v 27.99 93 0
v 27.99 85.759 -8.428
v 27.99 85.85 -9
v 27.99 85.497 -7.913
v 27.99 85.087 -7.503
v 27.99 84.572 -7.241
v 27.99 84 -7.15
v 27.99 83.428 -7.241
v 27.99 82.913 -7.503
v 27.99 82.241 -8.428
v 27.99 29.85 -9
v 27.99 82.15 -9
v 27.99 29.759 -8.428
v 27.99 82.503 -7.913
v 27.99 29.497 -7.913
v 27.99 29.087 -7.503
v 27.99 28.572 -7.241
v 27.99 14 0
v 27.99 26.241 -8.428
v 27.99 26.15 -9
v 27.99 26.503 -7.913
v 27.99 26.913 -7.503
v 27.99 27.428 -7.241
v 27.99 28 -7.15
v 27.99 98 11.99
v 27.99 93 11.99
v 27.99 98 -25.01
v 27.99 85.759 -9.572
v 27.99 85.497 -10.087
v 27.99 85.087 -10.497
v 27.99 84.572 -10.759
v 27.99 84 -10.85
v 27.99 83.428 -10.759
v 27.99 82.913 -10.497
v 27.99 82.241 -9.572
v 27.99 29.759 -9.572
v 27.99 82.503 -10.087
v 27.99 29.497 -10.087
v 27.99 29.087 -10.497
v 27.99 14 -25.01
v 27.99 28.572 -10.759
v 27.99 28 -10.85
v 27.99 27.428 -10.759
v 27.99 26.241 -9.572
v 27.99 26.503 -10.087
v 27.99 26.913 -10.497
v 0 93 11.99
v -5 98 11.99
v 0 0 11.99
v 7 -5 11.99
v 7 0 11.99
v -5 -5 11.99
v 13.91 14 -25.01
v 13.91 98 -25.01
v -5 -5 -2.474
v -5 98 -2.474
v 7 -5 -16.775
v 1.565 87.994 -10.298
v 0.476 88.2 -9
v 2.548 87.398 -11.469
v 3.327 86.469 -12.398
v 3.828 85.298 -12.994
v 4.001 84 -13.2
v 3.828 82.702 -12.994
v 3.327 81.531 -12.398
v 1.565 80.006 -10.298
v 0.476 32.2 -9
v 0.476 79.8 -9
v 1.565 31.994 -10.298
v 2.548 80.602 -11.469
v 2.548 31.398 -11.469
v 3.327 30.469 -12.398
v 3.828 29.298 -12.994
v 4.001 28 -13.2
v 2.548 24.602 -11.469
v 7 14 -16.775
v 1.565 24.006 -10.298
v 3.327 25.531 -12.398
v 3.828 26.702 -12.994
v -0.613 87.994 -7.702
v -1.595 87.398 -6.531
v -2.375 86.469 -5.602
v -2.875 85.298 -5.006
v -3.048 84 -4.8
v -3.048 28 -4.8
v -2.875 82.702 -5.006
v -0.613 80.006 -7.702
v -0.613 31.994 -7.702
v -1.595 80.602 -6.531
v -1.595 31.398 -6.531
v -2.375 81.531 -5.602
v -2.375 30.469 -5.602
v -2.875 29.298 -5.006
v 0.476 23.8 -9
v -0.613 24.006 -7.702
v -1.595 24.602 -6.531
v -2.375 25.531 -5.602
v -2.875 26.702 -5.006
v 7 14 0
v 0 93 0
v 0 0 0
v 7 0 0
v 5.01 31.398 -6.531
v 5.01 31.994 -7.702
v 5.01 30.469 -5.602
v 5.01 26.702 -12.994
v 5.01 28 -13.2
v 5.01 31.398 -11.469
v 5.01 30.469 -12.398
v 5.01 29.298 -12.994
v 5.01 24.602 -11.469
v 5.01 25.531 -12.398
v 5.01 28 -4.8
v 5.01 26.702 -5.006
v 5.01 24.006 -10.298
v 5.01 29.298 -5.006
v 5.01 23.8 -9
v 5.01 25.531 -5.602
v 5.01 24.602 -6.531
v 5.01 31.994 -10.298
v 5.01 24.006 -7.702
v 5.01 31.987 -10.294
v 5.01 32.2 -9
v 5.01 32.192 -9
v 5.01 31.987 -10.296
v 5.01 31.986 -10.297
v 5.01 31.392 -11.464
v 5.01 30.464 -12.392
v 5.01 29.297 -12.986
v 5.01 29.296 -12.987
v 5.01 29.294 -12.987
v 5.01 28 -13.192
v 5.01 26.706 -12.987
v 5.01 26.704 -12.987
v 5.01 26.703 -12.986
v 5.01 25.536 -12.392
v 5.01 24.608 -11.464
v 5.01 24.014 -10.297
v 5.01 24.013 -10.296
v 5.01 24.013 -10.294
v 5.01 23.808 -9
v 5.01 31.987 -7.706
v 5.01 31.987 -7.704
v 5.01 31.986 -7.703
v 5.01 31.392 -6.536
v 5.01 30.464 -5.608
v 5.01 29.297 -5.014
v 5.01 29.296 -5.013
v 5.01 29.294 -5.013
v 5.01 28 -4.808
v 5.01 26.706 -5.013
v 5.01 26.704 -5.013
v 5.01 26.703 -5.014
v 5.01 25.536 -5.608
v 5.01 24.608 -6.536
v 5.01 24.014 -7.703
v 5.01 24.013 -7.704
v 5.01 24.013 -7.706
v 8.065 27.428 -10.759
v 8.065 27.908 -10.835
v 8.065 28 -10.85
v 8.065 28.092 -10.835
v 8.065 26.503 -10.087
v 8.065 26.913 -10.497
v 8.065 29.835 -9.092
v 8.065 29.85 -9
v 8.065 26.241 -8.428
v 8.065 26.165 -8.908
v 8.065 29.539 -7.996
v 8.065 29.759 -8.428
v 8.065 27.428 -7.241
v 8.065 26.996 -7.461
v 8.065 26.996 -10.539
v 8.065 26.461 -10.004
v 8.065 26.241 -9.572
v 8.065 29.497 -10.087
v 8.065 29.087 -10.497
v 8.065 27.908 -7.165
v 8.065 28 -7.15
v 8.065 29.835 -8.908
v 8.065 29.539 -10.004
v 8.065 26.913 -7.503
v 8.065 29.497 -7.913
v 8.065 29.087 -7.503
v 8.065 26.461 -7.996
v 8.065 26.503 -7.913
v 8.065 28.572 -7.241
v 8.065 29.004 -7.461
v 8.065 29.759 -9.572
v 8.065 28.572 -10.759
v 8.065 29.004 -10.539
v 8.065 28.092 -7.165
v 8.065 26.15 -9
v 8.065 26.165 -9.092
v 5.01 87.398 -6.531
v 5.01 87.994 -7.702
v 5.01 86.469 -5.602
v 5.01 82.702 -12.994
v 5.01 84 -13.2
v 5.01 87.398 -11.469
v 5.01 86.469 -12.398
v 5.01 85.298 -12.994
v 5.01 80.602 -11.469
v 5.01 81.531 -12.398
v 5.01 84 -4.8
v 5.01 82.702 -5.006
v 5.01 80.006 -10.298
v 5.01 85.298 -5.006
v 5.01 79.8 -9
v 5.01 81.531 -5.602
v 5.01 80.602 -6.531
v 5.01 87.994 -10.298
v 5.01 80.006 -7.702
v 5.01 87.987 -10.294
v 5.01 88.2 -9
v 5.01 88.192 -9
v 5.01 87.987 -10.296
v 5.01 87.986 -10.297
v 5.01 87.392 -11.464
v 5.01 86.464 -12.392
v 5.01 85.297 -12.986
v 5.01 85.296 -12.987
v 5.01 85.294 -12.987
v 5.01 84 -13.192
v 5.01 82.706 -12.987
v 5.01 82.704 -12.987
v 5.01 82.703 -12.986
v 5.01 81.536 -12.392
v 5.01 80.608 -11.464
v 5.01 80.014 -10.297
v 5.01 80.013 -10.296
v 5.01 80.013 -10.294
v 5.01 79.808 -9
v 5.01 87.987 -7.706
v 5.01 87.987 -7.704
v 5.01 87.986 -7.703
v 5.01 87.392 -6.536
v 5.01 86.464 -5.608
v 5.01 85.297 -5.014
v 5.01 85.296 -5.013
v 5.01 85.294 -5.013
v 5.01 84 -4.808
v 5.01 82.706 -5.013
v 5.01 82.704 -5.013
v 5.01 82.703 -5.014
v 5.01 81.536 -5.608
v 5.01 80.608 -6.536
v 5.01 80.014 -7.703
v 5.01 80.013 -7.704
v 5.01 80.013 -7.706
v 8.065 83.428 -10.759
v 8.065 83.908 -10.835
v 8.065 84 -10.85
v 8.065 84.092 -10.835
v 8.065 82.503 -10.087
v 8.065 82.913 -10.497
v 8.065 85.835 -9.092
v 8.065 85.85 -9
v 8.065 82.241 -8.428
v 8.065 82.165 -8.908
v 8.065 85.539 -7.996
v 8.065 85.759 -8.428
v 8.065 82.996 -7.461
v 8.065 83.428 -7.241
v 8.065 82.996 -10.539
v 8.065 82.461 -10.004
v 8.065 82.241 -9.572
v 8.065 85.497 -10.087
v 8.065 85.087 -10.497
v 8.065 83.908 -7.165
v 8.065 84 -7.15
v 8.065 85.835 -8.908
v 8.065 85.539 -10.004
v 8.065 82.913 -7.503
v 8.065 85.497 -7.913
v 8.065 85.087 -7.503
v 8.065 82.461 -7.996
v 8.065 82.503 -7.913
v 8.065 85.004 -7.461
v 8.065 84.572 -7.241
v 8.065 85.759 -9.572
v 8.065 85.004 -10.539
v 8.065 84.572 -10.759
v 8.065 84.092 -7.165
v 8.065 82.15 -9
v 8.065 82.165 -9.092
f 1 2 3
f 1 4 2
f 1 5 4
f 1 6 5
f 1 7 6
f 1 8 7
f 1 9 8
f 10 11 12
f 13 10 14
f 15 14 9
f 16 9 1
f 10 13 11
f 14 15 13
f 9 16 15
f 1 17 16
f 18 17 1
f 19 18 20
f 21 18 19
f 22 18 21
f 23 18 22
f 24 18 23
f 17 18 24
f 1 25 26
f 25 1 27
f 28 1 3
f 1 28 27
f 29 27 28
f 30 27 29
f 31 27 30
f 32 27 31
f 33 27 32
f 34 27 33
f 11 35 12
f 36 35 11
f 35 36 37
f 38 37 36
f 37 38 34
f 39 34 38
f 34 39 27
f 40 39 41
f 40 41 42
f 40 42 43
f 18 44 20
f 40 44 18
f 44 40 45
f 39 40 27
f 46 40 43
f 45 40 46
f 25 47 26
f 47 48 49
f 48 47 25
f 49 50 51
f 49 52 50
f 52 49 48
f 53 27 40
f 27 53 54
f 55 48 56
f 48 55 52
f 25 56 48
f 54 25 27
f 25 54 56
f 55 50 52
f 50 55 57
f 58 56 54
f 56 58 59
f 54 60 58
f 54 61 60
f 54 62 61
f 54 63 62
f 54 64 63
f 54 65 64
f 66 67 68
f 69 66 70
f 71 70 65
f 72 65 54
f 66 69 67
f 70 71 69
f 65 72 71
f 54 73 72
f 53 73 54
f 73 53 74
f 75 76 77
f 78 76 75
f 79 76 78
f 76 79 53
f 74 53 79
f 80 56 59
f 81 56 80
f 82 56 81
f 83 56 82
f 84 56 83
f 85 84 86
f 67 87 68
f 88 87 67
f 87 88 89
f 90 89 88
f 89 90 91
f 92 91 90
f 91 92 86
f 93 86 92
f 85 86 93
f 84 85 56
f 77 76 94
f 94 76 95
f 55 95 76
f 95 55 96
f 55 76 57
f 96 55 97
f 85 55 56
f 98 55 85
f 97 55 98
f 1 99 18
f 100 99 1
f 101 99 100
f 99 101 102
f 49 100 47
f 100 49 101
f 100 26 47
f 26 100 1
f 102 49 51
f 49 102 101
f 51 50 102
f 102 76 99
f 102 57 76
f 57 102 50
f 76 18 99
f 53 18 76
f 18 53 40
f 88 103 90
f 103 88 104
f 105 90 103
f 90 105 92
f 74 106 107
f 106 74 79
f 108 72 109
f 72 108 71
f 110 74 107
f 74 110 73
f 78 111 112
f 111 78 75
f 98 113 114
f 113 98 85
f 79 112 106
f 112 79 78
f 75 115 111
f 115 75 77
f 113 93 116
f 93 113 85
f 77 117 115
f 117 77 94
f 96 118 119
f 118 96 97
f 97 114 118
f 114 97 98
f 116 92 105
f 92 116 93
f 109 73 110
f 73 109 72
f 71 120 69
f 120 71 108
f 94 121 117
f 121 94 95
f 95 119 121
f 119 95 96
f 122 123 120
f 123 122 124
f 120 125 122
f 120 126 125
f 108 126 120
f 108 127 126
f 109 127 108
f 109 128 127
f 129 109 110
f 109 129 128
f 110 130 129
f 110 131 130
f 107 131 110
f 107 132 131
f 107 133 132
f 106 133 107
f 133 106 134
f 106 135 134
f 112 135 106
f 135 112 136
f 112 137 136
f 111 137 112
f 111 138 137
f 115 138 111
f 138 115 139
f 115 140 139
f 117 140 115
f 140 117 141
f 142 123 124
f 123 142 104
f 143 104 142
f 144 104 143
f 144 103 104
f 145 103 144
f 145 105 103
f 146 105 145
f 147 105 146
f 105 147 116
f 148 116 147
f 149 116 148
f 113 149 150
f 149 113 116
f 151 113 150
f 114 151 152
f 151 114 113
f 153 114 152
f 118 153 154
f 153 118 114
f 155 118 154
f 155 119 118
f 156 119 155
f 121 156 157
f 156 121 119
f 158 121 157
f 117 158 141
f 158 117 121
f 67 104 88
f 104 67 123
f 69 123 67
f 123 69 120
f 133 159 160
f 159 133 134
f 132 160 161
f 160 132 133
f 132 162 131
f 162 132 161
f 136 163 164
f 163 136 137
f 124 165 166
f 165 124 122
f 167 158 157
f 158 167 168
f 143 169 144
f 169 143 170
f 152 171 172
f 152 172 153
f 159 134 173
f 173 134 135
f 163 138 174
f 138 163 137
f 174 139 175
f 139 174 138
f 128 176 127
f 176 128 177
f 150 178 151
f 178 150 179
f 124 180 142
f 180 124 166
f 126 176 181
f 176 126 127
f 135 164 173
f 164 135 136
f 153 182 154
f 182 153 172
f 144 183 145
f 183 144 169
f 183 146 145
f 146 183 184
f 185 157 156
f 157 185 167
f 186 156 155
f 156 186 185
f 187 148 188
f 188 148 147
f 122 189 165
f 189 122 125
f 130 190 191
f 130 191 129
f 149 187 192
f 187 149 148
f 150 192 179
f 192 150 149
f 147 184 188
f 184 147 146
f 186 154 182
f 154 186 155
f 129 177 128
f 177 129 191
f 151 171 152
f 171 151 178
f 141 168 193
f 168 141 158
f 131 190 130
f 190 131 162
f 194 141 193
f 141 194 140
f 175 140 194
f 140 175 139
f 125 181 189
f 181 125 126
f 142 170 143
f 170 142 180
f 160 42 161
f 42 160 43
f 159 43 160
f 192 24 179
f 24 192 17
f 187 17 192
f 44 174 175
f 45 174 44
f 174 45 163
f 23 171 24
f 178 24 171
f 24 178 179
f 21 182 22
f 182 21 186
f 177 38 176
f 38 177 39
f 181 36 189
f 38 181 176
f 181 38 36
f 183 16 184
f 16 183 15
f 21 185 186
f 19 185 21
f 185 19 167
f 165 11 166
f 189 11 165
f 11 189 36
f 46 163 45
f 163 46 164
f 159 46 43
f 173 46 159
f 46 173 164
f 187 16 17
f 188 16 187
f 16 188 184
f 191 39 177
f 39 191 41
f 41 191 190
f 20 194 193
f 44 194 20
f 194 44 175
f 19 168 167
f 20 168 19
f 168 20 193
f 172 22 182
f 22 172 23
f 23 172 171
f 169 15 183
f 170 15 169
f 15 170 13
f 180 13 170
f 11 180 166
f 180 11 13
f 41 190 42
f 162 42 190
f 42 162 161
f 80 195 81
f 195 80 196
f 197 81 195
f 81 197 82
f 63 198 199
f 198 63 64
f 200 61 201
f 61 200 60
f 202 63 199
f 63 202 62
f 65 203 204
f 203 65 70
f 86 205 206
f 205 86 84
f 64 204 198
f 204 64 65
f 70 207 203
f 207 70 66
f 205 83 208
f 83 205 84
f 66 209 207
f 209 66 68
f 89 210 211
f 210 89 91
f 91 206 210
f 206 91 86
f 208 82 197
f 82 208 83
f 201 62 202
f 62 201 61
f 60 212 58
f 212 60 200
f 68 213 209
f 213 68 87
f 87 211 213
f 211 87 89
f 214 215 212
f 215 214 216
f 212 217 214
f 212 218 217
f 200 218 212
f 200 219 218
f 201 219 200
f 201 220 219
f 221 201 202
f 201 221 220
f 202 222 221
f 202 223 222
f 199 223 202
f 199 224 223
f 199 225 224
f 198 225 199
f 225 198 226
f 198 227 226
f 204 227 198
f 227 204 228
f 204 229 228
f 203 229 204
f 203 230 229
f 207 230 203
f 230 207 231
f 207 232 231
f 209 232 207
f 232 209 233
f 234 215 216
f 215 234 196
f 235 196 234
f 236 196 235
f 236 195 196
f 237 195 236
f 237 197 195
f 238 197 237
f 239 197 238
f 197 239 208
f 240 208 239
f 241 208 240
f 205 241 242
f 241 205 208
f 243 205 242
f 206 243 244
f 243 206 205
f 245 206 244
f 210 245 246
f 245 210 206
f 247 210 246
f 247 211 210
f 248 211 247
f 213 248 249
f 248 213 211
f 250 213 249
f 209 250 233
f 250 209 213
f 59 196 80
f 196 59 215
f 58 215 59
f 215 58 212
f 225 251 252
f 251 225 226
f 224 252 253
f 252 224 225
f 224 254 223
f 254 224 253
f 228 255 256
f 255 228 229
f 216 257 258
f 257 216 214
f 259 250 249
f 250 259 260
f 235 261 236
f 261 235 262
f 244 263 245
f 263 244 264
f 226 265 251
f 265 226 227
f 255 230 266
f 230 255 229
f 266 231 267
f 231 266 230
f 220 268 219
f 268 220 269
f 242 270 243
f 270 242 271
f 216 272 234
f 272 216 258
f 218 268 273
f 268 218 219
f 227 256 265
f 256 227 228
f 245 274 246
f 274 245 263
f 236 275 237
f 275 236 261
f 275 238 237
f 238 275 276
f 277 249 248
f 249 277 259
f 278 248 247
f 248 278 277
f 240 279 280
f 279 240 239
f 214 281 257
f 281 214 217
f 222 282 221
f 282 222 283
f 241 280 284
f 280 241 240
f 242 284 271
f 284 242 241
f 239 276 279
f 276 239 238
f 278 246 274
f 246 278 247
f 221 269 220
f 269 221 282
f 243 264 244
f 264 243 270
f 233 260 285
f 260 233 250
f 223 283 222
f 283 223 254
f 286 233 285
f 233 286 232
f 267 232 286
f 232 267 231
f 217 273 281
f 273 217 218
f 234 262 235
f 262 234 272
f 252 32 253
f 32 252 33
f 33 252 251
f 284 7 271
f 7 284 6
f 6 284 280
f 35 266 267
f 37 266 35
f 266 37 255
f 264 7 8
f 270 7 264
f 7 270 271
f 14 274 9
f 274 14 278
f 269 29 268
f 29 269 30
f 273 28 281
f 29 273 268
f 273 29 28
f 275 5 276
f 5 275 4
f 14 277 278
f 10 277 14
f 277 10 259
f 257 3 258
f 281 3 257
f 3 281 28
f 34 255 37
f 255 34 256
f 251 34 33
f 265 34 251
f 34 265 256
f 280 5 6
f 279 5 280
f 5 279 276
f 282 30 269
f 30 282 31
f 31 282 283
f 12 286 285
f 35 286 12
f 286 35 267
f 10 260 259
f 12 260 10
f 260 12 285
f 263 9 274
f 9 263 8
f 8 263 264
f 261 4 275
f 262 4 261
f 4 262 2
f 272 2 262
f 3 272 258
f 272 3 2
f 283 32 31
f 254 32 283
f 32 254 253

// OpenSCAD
brick_dim = [28, 93, 12];

module brick() {
  cube(brick_dim);
  
  translate([7, -14, -30])
  cube([30, 28, 50]);
}

module shelf_exterior() {
  difference() {
    translate([-5, -5, -25.01])
    cube(brick_dim + [4.99, 10, 25]);
    
    // Chamfer the front bottom.
    translate([-22, 0, -60])
    rotate([0, 50, 0])
    cube([100, 400, 100], center=true);
  }
}

module screw() {
  $fn = 20;
  
  translate([0, 0, -100])
  linear_extrude(100.01)
  circle(d=8.4);
  
  linear_extrude(3.3, scale=3.3/8.3)
  circle(d=8.4);
  
  linear_extrude(100.01)
  circle(d=3.7);
}

module shelf() {
  difference() {
    shelf_exterior();
    brick();
  
    for (y = [28, 84])
    translate([5, y, -9])
    rotate([0, 90, 0])
    screw();
  }
}

shelf();
